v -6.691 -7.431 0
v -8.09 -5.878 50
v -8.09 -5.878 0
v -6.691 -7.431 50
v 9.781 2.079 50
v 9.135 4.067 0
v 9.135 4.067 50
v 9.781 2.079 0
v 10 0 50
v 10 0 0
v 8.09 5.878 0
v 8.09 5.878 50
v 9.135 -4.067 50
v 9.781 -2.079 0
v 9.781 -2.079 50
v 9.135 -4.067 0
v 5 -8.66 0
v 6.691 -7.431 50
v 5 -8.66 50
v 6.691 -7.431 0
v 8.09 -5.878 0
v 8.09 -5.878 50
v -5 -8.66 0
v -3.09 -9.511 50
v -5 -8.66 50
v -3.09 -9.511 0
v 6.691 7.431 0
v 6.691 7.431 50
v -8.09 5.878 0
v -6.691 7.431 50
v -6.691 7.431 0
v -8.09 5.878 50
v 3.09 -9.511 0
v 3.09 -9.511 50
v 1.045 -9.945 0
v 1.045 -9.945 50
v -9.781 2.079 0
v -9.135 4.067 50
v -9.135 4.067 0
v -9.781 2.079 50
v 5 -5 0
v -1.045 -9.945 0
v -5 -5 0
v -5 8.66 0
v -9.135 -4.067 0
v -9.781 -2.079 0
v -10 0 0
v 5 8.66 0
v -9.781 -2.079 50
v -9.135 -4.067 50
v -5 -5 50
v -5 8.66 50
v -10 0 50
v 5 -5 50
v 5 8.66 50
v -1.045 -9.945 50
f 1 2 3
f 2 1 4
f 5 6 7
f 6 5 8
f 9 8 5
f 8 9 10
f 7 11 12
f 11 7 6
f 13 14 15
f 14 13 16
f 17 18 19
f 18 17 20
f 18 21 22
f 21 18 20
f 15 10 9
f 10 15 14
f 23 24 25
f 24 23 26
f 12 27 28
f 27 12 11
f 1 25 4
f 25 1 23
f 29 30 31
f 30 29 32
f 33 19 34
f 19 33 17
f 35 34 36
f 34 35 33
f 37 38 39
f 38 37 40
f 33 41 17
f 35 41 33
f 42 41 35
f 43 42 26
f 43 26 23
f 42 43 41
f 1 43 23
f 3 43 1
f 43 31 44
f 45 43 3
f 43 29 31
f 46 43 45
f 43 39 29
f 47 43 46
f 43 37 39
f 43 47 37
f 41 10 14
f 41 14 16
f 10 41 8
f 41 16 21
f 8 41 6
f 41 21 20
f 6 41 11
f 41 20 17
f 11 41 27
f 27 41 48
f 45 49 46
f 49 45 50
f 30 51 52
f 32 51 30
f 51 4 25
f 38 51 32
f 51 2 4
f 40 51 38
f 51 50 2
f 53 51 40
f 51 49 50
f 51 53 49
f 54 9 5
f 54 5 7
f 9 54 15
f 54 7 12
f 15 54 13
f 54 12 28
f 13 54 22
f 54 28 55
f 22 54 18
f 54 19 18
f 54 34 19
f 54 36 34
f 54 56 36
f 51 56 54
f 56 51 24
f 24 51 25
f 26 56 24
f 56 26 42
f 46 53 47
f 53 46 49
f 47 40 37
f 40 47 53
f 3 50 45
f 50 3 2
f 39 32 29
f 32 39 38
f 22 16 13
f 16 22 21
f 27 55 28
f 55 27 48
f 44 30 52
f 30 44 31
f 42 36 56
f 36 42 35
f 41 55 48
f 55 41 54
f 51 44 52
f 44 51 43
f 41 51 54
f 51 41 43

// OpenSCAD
diameter_foot = 20;
width_foot = 50;

difference(){
    cylinder(h = width_foot, d = diameter_foot);
    translate([-diameter_foot / 4, -5, 0])   cube([diameter_foot/2, diameter_foot, width_foot]);
};
